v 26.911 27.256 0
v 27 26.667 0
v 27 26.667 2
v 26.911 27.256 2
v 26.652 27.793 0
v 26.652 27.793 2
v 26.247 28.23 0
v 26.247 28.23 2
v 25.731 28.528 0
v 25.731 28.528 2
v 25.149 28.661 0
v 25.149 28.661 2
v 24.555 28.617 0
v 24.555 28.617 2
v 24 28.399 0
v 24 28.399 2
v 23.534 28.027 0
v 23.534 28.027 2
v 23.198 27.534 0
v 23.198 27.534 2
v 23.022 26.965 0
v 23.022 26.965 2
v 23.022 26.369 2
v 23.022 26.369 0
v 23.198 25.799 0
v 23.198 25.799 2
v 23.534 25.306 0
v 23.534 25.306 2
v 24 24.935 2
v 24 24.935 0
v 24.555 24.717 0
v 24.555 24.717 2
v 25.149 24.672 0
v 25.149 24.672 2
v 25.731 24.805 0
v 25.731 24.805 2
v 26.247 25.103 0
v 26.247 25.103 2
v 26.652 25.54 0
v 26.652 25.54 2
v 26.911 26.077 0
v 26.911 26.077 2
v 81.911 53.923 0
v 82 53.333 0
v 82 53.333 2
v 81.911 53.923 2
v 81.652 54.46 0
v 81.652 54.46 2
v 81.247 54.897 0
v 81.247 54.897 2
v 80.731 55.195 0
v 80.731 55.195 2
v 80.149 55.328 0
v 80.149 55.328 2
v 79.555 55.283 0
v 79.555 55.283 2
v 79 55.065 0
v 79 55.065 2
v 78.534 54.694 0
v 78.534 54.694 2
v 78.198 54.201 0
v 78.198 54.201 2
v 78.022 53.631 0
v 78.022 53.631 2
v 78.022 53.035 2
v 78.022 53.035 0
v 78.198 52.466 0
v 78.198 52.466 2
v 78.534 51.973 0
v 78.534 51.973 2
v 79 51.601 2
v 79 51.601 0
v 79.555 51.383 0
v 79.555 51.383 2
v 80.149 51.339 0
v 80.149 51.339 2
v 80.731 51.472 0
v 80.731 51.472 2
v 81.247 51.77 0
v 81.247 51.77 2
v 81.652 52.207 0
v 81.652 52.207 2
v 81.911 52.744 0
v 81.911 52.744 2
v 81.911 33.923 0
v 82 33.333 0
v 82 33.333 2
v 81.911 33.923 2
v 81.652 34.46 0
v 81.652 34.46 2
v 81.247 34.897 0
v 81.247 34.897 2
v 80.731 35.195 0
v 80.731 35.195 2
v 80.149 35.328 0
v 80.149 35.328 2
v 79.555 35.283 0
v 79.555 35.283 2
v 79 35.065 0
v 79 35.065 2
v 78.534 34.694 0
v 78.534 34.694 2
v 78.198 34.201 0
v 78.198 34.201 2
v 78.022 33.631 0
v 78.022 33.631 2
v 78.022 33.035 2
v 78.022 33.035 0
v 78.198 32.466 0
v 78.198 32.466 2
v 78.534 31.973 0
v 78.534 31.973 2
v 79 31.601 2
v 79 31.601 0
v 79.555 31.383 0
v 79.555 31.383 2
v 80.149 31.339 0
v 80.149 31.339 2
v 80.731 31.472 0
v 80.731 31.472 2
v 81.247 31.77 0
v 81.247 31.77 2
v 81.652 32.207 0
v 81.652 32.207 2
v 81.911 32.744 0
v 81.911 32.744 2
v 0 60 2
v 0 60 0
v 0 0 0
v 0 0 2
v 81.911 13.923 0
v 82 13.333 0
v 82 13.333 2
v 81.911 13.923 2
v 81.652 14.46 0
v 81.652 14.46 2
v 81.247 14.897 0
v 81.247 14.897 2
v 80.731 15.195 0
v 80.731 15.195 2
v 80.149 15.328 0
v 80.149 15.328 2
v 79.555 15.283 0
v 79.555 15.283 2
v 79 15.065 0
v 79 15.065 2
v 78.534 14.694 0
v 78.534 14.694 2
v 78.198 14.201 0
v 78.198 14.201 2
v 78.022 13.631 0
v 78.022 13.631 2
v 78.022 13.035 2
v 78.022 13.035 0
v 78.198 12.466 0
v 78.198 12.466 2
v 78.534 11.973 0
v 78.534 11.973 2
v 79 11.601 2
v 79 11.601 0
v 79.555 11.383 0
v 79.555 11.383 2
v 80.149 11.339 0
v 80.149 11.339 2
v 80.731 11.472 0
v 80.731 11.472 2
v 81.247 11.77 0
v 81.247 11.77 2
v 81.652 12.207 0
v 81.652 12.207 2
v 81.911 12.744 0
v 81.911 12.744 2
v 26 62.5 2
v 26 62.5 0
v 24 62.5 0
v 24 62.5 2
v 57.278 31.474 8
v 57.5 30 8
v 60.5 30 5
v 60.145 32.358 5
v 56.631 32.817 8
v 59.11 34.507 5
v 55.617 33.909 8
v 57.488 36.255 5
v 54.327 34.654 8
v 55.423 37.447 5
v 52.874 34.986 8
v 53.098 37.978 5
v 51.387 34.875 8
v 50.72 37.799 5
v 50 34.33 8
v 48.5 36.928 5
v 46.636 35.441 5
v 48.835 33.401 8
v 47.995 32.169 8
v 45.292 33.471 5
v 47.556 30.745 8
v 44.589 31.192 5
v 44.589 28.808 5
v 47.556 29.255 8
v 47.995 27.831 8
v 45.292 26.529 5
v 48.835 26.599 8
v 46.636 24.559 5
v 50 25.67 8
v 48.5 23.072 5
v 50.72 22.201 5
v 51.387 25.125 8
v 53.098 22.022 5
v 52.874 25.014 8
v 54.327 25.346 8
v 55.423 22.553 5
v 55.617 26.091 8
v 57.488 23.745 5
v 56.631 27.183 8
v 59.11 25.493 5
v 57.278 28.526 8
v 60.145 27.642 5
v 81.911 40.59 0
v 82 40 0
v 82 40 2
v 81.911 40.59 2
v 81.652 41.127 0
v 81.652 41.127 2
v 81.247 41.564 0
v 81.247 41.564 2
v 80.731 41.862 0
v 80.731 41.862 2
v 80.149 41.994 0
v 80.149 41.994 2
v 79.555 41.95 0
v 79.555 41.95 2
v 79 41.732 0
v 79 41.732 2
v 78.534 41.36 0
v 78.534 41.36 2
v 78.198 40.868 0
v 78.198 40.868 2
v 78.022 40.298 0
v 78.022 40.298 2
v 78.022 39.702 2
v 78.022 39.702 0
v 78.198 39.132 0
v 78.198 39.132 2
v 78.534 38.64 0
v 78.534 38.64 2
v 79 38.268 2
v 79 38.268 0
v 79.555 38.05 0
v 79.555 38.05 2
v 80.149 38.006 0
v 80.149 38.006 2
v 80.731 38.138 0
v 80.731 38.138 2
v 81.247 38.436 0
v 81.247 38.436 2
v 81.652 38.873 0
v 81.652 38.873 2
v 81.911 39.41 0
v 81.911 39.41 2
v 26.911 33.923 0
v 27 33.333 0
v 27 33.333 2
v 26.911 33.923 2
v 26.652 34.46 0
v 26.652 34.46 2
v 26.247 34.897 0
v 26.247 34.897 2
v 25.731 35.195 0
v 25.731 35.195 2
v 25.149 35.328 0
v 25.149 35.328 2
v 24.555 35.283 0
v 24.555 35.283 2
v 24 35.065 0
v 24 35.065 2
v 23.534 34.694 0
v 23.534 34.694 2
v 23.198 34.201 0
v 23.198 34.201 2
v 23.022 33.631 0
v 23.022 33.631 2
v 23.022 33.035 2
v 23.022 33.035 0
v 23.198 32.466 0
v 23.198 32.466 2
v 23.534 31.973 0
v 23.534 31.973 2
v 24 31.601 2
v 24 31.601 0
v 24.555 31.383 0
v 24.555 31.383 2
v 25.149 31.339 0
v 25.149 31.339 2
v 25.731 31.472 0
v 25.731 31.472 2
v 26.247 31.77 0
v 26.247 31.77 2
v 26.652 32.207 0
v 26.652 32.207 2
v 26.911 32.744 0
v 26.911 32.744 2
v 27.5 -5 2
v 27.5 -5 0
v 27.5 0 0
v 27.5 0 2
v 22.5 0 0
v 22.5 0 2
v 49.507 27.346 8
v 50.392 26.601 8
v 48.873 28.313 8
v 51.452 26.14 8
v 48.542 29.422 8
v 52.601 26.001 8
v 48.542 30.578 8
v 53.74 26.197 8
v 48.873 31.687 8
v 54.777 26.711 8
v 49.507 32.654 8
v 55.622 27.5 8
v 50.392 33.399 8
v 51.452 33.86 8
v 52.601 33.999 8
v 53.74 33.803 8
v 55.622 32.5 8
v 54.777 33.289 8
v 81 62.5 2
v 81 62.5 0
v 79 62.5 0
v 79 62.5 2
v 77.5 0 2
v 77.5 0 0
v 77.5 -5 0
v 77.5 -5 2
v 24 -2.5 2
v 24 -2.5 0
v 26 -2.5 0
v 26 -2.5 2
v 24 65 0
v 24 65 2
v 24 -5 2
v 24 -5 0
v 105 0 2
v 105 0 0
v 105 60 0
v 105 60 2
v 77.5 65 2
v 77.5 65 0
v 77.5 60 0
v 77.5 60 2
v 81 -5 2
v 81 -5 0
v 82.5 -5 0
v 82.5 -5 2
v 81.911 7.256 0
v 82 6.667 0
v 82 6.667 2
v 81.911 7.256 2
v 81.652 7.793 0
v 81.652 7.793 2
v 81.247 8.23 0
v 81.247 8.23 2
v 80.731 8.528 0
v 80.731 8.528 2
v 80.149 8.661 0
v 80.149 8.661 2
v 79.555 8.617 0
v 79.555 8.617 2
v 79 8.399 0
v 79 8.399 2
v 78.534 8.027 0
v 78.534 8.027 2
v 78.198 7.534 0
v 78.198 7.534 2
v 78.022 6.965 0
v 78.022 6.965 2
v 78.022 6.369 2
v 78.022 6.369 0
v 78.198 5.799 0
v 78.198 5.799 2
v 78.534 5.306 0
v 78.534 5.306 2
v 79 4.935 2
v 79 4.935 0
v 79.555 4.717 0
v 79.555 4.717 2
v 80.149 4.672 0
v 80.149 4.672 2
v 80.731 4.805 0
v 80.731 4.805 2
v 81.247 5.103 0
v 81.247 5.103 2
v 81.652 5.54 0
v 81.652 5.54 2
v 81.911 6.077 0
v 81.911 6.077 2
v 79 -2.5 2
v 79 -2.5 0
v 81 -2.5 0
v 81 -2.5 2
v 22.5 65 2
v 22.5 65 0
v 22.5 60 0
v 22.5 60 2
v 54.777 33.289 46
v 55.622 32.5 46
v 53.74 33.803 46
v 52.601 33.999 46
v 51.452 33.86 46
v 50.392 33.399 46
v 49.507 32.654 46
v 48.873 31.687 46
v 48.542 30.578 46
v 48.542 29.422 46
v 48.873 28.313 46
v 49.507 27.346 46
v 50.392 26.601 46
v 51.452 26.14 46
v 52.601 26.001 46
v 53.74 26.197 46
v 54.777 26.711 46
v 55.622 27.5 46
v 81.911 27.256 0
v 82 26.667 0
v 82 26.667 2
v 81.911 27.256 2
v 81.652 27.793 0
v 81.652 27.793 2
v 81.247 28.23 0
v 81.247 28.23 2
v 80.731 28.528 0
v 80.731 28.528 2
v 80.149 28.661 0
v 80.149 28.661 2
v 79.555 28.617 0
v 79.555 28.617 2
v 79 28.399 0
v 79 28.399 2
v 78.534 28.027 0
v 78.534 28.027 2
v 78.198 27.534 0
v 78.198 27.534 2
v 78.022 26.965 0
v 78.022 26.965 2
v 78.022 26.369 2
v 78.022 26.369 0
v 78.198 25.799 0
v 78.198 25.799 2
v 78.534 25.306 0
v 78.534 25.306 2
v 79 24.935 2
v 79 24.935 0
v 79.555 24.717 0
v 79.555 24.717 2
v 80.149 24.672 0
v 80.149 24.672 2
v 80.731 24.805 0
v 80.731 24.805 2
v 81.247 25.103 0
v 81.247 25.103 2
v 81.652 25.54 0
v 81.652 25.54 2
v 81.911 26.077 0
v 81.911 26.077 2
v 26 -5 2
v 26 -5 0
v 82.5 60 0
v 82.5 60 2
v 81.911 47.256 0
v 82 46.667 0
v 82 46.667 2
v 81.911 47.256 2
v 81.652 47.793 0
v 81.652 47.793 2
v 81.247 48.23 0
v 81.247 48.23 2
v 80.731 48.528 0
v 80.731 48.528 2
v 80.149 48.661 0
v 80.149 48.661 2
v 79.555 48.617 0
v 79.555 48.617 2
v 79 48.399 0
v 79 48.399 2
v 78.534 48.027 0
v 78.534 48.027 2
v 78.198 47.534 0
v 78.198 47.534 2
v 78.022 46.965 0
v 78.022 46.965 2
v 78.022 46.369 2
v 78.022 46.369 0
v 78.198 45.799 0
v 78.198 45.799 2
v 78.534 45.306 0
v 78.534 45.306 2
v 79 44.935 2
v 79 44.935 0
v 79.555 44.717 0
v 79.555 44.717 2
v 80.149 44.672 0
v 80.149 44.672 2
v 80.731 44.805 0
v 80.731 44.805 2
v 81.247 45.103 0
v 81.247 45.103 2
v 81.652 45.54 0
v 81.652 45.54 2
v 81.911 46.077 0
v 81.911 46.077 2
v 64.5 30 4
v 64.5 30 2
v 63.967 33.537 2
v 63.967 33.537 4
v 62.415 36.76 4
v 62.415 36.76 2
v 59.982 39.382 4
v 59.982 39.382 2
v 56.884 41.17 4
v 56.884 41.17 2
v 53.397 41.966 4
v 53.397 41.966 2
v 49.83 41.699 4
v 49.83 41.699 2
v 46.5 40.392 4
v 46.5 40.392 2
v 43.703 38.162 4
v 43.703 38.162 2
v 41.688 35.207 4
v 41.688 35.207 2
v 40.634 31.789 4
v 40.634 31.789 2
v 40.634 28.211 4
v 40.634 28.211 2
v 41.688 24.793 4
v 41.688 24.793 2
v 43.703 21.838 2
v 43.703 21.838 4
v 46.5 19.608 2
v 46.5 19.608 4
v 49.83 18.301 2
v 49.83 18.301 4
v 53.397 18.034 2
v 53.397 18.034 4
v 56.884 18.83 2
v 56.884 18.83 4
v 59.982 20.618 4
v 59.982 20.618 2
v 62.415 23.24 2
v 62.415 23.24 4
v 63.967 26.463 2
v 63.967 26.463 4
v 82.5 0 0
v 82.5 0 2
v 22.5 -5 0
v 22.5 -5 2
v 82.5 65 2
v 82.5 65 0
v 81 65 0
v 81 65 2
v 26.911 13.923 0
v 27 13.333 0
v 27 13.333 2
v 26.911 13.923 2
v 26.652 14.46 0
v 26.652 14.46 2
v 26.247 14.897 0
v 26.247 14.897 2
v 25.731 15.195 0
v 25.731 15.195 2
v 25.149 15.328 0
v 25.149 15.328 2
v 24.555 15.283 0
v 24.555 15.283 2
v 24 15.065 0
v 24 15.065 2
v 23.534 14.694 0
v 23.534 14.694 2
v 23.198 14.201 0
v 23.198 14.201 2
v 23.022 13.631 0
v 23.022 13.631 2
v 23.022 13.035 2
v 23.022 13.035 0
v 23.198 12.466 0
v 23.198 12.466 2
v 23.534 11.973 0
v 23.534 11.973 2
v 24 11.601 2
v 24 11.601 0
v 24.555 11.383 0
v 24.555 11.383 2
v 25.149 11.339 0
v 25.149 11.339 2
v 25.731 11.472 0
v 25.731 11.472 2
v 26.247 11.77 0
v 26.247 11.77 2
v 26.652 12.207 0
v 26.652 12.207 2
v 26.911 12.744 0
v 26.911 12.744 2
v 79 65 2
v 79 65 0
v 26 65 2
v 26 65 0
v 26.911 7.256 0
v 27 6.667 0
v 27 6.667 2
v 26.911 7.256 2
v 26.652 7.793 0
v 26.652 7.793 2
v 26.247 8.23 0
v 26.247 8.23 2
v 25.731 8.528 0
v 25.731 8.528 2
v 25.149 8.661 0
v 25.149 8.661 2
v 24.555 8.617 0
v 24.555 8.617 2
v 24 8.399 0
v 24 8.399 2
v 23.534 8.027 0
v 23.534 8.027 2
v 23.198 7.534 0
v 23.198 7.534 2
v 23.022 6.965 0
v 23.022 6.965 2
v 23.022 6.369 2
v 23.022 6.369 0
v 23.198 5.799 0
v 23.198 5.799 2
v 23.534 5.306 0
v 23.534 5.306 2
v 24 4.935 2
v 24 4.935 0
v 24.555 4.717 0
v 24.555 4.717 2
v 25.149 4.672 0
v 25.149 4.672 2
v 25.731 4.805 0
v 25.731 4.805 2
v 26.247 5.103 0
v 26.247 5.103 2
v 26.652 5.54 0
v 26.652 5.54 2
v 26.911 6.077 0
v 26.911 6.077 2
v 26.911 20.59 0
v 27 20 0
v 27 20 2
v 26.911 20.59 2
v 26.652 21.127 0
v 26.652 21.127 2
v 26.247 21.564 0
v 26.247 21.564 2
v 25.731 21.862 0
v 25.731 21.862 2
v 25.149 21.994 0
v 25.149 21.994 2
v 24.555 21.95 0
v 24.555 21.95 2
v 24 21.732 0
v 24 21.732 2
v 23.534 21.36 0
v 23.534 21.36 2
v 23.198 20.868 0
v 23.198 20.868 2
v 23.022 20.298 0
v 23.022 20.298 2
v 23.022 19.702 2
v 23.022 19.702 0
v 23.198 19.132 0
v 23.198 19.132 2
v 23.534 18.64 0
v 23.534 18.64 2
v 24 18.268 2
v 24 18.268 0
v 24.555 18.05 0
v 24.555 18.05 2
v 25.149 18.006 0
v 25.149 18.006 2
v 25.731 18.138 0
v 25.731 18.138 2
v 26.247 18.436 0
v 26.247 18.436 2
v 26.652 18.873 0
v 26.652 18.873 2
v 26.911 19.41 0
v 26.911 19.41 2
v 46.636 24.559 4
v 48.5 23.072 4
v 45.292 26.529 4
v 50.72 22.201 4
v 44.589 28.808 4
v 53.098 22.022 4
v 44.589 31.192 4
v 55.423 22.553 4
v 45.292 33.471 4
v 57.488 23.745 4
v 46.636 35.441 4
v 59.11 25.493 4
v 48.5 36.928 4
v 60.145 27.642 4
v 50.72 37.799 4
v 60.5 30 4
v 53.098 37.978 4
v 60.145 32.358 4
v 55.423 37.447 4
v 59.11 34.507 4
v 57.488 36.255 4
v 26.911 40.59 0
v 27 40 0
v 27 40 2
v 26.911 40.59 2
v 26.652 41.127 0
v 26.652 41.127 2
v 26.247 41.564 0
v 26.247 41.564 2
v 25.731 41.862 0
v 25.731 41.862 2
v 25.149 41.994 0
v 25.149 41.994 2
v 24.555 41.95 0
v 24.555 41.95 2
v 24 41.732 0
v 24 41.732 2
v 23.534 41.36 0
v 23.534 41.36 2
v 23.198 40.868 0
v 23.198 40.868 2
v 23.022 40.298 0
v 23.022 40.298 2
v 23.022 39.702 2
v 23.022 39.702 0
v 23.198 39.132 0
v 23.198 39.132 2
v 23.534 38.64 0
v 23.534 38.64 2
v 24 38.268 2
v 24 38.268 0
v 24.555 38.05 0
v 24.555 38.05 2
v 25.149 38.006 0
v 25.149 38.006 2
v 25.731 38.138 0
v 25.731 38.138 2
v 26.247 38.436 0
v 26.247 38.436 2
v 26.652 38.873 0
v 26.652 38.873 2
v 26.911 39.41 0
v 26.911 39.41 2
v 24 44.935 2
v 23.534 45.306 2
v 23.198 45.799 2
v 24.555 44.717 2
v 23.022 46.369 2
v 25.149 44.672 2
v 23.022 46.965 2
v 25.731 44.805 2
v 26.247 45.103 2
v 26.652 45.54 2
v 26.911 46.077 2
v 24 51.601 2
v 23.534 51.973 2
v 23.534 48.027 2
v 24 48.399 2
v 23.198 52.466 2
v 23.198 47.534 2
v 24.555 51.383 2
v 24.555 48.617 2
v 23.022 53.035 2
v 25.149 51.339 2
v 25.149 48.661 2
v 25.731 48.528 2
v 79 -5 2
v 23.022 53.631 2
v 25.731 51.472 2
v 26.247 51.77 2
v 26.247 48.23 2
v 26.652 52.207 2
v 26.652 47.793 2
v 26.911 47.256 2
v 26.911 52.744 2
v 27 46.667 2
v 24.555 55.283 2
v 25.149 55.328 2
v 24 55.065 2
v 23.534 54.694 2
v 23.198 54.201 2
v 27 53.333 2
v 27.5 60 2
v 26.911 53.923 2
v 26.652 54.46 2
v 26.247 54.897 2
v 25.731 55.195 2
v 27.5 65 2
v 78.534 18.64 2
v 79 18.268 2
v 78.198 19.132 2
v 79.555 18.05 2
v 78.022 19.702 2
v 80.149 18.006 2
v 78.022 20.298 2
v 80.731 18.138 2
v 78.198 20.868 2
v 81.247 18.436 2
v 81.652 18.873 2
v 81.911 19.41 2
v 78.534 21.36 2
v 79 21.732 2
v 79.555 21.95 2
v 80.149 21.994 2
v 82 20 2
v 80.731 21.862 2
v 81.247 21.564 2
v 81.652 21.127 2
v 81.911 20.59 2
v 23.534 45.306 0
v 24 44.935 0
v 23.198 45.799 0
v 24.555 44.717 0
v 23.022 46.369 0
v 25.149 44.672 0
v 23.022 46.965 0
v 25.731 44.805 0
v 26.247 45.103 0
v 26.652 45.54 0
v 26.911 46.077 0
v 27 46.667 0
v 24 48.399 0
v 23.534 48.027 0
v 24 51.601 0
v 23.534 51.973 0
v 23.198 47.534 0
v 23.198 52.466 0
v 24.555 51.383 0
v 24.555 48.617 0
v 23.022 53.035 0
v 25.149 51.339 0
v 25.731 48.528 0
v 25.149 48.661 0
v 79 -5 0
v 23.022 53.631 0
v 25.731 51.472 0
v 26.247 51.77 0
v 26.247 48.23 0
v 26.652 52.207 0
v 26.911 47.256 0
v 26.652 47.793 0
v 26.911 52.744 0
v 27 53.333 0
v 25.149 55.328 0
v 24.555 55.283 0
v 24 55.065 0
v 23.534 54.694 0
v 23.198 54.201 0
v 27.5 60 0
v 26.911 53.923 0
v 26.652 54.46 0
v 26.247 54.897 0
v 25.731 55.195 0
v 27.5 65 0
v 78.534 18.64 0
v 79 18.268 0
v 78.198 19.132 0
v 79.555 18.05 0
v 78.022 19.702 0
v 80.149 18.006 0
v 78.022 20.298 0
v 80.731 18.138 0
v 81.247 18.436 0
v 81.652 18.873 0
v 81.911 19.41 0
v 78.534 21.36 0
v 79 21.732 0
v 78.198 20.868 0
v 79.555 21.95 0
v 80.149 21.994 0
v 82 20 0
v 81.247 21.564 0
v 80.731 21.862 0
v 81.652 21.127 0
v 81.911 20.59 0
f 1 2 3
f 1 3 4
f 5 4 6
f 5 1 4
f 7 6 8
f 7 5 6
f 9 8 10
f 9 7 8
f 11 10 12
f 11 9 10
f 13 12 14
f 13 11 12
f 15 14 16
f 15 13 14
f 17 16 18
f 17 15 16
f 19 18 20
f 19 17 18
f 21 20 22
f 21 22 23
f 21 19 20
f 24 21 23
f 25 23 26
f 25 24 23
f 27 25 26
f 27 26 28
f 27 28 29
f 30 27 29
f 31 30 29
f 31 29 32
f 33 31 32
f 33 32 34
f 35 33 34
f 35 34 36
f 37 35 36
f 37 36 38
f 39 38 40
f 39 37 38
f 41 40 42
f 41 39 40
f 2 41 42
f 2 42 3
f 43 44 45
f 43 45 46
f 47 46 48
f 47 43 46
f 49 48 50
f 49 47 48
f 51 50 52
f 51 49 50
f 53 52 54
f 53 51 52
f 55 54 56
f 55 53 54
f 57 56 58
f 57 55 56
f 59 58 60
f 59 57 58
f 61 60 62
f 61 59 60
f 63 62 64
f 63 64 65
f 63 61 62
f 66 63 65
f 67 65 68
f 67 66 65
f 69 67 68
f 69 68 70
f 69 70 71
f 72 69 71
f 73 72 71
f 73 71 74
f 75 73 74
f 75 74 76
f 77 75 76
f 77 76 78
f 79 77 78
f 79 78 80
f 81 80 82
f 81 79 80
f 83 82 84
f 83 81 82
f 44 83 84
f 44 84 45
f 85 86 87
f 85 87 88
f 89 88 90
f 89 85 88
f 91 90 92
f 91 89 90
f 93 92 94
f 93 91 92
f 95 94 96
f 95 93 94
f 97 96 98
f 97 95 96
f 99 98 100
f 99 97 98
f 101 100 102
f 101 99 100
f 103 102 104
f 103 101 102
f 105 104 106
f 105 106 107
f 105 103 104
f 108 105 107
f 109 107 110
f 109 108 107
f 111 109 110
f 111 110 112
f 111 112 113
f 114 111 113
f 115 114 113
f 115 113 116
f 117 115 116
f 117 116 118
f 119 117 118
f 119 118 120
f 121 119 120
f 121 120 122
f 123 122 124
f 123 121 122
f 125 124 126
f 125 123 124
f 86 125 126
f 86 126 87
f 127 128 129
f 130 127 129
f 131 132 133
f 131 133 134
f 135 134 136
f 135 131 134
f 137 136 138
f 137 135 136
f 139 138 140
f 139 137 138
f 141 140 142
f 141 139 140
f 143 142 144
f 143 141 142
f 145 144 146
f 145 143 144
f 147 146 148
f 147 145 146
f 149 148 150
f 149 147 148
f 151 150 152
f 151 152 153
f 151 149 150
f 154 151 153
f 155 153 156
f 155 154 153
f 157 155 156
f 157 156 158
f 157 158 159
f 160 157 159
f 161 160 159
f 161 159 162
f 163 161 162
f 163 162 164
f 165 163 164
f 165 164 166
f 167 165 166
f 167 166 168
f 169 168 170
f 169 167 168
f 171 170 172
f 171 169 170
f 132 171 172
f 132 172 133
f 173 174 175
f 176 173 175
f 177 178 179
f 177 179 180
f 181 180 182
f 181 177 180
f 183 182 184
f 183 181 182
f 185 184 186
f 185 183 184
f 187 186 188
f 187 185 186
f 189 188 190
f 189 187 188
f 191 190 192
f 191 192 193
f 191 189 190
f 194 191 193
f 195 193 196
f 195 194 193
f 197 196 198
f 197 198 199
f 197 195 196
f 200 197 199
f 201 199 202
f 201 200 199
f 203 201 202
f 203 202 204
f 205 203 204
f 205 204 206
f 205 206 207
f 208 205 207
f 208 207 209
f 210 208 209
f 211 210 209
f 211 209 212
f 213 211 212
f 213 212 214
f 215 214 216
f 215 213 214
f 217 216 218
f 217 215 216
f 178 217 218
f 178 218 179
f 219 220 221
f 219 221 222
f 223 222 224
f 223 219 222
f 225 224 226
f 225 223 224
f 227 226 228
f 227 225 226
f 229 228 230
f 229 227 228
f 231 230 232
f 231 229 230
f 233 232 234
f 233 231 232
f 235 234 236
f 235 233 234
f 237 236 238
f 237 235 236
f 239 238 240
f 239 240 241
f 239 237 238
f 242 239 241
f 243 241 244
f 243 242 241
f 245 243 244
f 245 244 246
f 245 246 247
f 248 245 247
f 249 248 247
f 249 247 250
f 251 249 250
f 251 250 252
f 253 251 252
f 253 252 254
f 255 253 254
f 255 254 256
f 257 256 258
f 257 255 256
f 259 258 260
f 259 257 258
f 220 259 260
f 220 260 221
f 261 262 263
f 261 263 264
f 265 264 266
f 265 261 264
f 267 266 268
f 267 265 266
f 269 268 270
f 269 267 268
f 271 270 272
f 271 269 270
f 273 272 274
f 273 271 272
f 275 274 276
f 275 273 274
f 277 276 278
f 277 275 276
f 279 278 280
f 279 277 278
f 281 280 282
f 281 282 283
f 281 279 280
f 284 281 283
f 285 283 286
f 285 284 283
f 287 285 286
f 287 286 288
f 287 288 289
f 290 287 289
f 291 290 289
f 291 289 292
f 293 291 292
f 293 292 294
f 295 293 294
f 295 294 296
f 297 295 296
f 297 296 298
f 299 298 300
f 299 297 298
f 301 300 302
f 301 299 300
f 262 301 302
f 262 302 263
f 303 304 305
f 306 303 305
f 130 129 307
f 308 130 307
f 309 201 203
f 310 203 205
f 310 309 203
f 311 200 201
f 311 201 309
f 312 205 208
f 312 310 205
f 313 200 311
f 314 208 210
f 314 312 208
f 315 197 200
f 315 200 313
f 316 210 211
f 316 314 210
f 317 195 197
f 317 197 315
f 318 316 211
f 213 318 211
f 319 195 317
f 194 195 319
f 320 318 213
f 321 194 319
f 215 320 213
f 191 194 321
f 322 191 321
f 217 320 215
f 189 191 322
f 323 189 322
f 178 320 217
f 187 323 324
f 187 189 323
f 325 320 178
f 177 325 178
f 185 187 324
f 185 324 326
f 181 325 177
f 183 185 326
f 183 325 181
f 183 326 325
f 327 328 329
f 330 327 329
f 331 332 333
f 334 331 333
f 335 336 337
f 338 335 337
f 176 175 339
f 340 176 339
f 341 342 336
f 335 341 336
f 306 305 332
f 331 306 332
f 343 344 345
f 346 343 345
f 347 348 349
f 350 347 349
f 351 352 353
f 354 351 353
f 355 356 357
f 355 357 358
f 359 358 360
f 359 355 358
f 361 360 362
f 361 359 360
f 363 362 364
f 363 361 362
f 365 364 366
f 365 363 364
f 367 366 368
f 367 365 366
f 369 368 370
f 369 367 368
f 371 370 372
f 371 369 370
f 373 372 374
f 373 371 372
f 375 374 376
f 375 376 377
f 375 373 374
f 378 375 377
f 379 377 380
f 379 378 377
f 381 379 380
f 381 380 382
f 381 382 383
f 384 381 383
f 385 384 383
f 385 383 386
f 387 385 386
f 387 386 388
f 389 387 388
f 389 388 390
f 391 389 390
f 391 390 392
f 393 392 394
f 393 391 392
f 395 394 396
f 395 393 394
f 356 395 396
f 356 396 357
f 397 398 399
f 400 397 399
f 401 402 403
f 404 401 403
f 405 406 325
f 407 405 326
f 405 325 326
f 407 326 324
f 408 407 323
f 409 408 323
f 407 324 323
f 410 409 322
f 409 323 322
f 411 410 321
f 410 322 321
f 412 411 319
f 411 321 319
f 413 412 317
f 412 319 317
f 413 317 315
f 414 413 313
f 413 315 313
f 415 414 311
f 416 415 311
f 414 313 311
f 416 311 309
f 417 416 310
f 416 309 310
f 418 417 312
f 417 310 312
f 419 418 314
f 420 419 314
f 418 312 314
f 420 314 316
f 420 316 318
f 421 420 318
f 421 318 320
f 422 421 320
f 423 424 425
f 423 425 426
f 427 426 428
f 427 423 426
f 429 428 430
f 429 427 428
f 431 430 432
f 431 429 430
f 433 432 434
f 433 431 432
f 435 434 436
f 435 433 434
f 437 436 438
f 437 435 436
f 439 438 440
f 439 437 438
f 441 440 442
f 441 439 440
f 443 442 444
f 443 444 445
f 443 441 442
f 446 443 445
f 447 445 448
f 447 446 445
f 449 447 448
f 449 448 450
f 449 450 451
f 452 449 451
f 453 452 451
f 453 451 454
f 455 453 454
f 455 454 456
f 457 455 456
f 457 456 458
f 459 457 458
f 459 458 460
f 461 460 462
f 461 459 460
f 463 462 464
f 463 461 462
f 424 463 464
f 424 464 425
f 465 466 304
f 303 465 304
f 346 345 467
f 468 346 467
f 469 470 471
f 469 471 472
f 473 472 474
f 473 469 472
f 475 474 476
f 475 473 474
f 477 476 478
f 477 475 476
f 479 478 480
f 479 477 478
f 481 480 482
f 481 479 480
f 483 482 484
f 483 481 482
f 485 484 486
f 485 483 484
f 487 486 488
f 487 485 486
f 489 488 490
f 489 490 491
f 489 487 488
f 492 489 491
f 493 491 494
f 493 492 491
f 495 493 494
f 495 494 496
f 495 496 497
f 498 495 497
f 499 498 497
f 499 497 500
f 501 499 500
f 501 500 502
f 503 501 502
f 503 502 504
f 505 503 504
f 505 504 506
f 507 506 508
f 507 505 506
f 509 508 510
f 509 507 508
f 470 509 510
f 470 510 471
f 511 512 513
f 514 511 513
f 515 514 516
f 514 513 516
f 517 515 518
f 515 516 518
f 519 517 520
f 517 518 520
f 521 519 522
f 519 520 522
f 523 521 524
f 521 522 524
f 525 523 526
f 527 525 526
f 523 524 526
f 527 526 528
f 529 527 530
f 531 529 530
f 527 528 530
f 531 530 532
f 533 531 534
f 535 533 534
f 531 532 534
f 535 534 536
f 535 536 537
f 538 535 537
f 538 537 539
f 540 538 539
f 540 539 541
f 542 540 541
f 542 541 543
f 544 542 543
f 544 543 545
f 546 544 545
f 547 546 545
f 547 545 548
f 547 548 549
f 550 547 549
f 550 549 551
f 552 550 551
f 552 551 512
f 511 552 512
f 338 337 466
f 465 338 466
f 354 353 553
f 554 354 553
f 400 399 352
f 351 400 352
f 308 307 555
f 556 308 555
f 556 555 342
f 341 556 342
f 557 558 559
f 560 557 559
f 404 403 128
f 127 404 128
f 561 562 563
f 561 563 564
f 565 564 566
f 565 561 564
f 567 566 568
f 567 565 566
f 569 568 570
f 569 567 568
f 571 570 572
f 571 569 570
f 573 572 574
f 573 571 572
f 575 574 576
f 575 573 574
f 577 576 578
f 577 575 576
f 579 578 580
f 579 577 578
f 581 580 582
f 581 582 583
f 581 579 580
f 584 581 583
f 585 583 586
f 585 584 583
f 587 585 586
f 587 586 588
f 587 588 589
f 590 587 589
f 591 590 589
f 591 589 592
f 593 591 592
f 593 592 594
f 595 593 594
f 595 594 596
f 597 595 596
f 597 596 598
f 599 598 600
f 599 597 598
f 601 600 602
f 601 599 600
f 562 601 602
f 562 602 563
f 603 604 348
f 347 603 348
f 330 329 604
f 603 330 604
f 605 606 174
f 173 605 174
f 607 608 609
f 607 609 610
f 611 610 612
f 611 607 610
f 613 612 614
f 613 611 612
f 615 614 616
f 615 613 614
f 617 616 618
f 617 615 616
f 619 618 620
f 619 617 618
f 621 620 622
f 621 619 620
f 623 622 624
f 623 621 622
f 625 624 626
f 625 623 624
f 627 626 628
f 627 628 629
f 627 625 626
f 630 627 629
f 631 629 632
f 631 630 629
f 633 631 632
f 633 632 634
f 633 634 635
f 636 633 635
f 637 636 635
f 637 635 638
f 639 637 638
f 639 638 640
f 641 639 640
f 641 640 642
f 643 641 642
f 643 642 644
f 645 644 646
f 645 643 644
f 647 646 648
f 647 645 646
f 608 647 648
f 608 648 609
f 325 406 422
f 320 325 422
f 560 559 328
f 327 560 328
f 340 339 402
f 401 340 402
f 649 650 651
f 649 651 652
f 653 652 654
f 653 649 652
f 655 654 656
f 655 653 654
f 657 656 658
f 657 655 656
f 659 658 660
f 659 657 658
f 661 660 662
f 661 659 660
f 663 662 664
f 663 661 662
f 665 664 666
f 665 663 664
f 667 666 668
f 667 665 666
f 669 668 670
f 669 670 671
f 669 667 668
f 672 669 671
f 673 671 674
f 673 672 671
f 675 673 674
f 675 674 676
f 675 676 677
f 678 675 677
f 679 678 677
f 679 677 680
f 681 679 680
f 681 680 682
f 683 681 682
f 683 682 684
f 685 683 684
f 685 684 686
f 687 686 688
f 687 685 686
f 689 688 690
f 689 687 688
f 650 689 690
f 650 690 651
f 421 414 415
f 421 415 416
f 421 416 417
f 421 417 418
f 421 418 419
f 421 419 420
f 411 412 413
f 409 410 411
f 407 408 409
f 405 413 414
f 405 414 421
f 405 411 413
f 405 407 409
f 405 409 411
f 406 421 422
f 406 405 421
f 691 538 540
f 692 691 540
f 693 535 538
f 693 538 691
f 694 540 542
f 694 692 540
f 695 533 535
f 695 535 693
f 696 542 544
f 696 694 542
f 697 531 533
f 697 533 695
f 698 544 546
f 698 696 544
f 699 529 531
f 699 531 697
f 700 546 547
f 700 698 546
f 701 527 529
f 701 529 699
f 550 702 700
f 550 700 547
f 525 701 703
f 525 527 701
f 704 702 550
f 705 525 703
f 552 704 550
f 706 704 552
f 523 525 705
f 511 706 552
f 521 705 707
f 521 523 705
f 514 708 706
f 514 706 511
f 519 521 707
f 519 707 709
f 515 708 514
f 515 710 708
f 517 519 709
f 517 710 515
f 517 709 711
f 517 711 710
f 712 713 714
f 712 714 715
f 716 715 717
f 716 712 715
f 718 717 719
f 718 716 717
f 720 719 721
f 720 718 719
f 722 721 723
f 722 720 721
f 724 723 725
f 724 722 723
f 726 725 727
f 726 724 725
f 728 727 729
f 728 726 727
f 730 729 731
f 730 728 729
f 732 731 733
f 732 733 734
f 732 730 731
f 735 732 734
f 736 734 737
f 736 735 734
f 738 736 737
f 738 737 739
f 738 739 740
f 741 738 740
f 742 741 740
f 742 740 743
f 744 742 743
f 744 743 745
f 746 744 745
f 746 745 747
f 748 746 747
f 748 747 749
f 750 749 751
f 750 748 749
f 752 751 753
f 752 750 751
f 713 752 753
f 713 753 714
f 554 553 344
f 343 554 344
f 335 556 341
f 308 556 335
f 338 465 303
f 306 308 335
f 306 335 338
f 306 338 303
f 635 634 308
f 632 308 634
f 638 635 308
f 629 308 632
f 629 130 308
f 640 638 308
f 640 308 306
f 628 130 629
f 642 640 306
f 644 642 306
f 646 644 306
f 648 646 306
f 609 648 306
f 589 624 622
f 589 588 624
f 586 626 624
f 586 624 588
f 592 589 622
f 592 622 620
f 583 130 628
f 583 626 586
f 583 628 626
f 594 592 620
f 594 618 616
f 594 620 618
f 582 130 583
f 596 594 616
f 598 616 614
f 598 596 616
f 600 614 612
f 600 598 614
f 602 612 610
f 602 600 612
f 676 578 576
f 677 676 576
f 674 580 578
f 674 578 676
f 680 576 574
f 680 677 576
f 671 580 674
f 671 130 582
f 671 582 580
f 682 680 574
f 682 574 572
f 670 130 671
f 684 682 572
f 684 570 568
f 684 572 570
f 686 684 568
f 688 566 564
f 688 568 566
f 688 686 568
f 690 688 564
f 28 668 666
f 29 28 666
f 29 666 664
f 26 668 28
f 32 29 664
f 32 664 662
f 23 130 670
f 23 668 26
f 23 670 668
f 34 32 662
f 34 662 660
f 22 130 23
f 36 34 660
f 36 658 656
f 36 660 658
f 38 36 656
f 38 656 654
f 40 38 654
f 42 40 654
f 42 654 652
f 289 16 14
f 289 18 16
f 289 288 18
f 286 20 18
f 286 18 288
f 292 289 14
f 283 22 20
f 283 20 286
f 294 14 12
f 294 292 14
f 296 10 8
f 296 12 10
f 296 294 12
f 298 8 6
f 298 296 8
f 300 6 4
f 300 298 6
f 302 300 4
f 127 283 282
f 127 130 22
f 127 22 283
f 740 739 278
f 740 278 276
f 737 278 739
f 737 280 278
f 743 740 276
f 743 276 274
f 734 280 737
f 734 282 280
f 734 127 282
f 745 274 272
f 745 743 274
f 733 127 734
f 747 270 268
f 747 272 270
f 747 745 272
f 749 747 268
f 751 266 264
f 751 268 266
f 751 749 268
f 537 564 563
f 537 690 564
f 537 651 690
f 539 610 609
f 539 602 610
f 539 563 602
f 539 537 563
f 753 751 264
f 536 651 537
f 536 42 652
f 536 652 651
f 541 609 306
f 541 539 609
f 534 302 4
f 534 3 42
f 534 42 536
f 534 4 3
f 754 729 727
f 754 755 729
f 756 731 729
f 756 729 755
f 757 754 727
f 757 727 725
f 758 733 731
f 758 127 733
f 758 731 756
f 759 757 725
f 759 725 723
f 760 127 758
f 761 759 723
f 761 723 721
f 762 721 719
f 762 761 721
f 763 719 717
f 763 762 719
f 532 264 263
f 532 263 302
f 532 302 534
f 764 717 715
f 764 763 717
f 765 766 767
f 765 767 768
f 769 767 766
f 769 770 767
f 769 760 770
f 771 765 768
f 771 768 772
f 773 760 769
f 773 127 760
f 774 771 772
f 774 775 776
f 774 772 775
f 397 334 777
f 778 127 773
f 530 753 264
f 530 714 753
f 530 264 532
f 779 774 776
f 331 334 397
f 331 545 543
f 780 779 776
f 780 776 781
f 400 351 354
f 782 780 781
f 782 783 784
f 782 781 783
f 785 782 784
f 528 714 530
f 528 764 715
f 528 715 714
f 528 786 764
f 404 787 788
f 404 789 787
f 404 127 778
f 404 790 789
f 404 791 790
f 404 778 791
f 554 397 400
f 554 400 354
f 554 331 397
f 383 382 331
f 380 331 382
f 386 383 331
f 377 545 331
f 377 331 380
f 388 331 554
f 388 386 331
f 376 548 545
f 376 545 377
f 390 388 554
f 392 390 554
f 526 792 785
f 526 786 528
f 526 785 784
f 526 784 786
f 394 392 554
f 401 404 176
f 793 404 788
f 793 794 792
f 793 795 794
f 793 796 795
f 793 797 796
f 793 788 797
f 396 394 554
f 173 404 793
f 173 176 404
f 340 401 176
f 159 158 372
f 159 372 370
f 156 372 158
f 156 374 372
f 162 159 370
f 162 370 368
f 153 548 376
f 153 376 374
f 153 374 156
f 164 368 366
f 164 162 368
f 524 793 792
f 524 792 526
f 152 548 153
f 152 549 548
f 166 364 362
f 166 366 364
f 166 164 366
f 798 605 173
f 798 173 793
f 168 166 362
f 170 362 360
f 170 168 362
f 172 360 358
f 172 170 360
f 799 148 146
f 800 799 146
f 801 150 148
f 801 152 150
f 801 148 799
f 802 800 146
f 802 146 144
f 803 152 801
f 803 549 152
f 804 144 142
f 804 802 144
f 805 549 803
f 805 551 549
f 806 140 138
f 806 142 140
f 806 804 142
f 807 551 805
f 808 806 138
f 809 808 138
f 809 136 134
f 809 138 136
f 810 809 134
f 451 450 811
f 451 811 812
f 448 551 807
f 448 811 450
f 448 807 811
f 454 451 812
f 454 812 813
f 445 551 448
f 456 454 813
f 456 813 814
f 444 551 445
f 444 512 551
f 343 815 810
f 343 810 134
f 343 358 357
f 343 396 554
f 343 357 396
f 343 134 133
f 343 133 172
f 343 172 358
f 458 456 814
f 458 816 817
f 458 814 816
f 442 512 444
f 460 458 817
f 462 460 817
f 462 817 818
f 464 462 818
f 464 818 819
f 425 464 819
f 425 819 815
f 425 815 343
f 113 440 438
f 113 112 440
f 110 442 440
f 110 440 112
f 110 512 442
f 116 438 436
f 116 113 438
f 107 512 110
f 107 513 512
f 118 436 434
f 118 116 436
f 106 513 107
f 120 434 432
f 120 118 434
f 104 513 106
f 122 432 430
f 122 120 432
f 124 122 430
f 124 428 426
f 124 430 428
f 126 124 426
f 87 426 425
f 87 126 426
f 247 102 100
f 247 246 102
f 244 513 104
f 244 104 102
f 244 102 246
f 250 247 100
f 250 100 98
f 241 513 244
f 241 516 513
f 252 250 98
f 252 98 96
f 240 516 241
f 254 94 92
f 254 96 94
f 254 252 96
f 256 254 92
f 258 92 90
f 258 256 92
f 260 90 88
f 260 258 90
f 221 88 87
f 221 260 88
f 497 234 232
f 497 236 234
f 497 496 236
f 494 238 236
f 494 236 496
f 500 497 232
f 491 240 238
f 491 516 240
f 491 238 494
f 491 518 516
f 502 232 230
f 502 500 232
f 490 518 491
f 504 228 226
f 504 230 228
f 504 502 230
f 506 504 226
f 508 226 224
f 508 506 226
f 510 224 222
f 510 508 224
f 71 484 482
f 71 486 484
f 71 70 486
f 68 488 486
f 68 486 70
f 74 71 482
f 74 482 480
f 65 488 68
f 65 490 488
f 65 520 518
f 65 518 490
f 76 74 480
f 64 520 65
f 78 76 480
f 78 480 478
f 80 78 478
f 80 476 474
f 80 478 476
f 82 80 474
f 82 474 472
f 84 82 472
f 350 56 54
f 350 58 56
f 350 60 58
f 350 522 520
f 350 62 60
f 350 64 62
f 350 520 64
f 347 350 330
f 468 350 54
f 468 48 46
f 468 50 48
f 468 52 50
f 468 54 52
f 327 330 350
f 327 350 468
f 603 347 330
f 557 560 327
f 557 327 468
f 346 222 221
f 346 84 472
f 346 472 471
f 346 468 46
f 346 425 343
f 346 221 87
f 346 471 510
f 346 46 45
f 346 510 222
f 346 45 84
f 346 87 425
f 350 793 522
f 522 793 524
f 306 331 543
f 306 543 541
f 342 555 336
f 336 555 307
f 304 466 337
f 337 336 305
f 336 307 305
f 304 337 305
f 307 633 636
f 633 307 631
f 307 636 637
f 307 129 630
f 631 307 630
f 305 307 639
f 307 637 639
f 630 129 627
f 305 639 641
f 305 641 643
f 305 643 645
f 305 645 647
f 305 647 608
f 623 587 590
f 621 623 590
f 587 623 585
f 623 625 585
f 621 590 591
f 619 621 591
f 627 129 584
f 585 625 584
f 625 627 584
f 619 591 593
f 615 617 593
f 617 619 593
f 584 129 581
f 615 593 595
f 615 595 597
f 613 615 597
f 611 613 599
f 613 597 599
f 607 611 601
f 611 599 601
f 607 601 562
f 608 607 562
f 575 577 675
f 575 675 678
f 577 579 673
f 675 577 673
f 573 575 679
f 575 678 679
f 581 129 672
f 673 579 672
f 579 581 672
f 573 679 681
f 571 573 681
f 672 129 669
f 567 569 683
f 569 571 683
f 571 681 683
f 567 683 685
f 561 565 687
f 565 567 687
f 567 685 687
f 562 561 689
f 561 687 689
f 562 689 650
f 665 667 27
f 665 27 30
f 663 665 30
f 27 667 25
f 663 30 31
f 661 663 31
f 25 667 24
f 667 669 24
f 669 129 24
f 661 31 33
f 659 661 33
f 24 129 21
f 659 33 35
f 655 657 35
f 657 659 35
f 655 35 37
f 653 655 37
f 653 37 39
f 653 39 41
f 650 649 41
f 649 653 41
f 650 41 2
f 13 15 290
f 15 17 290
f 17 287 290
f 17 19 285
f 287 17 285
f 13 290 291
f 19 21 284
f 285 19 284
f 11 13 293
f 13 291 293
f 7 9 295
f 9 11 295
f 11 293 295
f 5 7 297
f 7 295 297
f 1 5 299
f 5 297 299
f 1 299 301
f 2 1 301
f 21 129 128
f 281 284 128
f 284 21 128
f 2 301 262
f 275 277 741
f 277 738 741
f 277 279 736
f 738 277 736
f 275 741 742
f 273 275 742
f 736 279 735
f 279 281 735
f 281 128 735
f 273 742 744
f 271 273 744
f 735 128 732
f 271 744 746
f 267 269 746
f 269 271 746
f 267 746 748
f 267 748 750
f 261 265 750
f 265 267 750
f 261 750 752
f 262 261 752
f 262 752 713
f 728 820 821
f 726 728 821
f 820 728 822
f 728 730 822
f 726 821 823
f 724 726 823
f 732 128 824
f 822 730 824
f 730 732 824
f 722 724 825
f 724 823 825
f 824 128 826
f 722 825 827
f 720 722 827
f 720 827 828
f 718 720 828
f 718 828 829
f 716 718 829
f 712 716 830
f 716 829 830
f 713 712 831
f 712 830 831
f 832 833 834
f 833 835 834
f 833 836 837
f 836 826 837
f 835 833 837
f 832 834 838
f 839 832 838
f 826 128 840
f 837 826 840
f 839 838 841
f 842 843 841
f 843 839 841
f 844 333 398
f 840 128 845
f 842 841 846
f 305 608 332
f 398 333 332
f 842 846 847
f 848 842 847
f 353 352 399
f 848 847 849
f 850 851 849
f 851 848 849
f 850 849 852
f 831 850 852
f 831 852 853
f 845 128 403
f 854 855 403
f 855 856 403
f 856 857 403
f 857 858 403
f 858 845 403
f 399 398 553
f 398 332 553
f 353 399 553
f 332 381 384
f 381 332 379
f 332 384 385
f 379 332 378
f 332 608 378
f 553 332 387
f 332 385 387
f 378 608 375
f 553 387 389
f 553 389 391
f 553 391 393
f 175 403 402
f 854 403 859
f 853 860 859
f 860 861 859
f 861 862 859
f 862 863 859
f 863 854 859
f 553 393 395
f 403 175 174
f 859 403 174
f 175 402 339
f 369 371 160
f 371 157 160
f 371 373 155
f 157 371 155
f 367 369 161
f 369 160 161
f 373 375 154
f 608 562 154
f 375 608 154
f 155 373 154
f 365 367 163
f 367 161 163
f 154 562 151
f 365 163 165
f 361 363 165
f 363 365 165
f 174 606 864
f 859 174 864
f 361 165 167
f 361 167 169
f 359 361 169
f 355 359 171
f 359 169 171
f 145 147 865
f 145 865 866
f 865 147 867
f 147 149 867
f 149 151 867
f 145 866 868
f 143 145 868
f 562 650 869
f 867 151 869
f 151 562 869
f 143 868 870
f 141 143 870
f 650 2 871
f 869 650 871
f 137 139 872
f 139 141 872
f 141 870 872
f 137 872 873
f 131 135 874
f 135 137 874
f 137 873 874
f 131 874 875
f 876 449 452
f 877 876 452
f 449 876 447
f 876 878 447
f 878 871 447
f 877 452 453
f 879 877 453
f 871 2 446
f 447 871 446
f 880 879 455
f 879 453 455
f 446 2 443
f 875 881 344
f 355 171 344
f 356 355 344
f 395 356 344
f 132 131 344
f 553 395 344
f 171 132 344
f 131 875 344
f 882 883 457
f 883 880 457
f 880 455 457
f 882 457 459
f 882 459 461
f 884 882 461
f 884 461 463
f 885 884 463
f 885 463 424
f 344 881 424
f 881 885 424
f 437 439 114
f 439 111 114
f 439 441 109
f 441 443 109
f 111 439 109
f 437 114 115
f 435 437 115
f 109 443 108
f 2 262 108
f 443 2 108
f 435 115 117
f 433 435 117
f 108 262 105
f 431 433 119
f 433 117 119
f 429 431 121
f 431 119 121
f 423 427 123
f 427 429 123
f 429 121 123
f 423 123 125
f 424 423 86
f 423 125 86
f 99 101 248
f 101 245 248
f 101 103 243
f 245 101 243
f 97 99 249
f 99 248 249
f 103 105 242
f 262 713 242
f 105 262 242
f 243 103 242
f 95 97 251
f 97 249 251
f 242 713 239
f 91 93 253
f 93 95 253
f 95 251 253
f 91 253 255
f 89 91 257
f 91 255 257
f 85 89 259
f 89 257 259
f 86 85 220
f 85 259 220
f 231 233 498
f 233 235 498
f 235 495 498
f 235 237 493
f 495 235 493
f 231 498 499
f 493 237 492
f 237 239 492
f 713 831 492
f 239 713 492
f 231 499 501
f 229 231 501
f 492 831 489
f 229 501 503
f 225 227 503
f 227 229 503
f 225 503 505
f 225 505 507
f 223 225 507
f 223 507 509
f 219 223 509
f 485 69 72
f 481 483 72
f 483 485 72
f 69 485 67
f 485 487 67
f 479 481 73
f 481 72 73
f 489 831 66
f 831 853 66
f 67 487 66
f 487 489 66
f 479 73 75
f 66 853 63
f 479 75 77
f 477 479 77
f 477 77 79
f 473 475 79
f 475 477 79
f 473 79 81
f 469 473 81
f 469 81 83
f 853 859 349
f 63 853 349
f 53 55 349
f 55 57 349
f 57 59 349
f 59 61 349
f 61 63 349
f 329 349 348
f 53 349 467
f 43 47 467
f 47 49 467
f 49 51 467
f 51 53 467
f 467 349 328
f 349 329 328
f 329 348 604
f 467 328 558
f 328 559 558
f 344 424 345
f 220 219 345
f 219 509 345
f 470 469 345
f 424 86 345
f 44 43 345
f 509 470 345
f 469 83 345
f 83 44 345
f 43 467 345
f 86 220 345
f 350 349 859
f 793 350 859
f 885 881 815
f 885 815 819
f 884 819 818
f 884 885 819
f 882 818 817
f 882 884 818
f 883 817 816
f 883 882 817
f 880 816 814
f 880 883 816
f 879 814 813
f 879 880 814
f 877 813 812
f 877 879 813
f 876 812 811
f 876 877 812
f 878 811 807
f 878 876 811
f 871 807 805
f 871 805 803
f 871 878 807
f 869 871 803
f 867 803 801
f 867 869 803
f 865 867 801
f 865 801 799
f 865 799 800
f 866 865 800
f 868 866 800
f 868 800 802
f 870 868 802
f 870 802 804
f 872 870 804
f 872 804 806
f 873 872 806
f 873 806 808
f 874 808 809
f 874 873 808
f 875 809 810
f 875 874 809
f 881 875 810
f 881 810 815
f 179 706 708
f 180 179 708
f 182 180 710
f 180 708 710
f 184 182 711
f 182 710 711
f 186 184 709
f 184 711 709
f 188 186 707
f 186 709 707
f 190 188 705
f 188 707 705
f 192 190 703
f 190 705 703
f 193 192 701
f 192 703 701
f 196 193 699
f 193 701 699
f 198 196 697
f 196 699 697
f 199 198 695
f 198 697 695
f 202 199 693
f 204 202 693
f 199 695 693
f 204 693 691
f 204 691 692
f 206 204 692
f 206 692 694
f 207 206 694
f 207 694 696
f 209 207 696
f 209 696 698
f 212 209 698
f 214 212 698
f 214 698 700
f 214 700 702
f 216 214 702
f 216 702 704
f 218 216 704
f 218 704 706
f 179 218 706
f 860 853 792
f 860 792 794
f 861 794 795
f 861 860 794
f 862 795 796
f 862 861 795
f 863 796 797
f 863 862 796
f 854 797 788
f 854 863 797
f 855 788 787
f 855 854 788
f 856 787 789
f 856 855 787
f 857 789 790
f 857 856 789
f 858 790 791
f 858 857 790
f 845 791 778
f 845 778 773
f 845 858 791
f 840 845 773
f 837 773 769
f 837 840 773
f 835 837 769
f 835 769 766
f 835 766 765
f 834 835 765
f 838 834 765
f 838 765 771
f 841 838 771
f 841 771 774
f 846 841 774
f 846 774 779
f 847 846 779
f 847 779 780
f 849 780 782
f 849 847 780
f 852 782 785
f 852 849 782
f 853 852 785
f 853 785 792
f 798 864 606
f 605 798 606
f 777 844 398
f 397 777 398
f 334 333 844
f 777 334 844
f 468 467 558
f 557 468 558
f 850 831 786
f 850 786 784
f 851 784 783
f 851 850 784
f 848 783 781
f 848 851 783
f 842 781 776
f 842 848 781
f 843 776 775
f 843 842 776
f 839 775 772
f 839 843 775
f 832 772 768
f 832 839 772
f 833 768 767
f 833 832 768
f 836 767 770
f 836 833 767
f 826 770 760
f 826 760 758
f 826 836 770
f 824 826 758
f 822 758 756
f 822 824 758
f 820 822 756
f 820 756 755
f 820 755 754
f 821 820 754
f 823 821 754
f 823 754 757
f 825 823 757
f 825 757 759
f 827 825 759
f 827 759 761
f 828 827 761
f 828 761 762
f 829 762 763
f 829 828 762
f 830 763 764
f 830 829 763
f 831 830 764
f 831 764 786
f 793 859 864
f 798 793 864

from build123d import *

# Parameters (mm, degrees)
SKETCH_R     = 2
PAD_DEPTH    = 2
SKETCH001_R  = 4
PAD001_DEPTH = 46
SKETCH002_R  = 8
PAD002_DEPTH = 8
SKETCH003_R  = 12
PAD003_DEPTH = 4
POCKET_DEPTH = 38
CHAMFER_SIZE = 3


with BuildPart() as part:
    # Sketch → Pad (new body)
    with BuildSketch(Plane.XY):
        Polygon((105, 0), (105, 60), (82.5, 60), (82.5, 65), (81, 65), (81, 62.5), (80, 62.5), (79, 62.5), (79, 65), (77.5, 65), (77.5, 60), (27.5, 60), (27.5, 65), (26, 65), (26, 62.5), (25, 62.5), (24, 62.5), (24, 65), (22.5, 65), (22.5, 60), (0, 60), (0, 0), (22.5, 0), (22.5, -5), (24, -5), (24, -2.5), (25, -2.5), (26, -2.5), (26, -5), (27.5, -5), (27.5, 0), (77.5, 0), (77.5, -5), (79, -5), (79, -2.5), (80, -2.5), (81, -2.5), (81, -5), (82.5, -5), (82.5, 0), align=None)
        with Locations((25, 46.666667)):
            Circle(SKETCH_R, mode=Mode.SUBTRACT)
        with Locations((25, 40)):
            Circle(SKETCH_R, mode=Mode.SUBTRACT)
        with Locations((25, 33.333333)):
            Circle(SKETCH_R, mode=Mode.SUBTRACT)
        with Locations((25, 26.666667)):
            Circle(SKETCH_R, mode=Mode.SUBTRACT)
        with Locations((25, 20)):
            Circle(SKETCH_R, mode=Mode.SUBTRACT)
        with Locations((25, 13.333333)):
            Circle(SKETCH_R, mode=Mode.SUBTRACT)
        with Locations((25, 6.666667)):
            Circle(SKETCH_R, mode=Mode.SUBTRACT)
        with Locations((80, 6.666667)):
            Circle(SKETCH_R, mode=Mode.SUBTRACT)
        with Locations((80, 13.333333)):
            Circle(SKETCH_R, mode=Mode.SUBTRACT)
        with Locations((80, 20)):
            Circle(SKETCH_R, mode=Mode.SUBTRACT)
        with Locations((80, 26.666667)):
            Circle(SKETCH_R, mode=Mode.SUBTRACT)
        with Locations((80, 33.333333)):
            Circle(SKETCH_R, mode=Mode.SUBTRACT)
        with Locations((80, 46.666667)):
            Circle(SKETCH_R, mode=Mode.SUBTRACT)
        with Locations((80, 40)):
            Circle(SKETCH_R, mode=Mode.SUBTRACT)
        with Locations((25, 53.333333)):
            Circle(SKETCH_R, mode=Mode.SUBTRACT)
        with Locations((80, 53.333333)):
            Circle(SKETCH_R, mode=Mode.SUBTRACT)
    extrude(amount=PAD_DEPTH)

    # Sketch001 → Pad001 (join)
    with BuildSketch(Plane.XY):
        with Locations((52.5, 30)):
            Circle(SKETCH001_R)
    extrude(amount=PAD001_DEPTH)

    # Sketch002 → Pad002 (join)
    with BuildSketch(Plane.XY):
        with Locations((52.5, 30)):
            Circle(SKETCH002_R)
    extrude(amount=PAD002_DEPTH)

    # Sketch003 → Pad003 (join)
    with BuildSketch(Plane.XY):
        with Locations((52.5, 30)):
            Circle(SKETCH003_R)
    extrude(amount=PAD003_DEPTH)

    # Sketch004 → Pocket (cut)
    with BuildSketch(Plane.XY.offset(46)):
        with BuildLine():
            Line((55.622499, 32.5), (55.622499, 27.5))
            ThreePointArc((55.622499, 27.5), (56.5, 30), (55.622499, 32.5))
        make_face()
    extrude(amount=-POCKET_DEPTH, mode=Mode.SUBTRACT)

    # Chamfer
    chamfer_edges = [part.edges().sort_by_distance(p)[0] for p in [
        (44.5, 30, 8),
    ]]
    chamfer(chamfer_edges, length=CHAMFER_SIZE)


solid = part.part
